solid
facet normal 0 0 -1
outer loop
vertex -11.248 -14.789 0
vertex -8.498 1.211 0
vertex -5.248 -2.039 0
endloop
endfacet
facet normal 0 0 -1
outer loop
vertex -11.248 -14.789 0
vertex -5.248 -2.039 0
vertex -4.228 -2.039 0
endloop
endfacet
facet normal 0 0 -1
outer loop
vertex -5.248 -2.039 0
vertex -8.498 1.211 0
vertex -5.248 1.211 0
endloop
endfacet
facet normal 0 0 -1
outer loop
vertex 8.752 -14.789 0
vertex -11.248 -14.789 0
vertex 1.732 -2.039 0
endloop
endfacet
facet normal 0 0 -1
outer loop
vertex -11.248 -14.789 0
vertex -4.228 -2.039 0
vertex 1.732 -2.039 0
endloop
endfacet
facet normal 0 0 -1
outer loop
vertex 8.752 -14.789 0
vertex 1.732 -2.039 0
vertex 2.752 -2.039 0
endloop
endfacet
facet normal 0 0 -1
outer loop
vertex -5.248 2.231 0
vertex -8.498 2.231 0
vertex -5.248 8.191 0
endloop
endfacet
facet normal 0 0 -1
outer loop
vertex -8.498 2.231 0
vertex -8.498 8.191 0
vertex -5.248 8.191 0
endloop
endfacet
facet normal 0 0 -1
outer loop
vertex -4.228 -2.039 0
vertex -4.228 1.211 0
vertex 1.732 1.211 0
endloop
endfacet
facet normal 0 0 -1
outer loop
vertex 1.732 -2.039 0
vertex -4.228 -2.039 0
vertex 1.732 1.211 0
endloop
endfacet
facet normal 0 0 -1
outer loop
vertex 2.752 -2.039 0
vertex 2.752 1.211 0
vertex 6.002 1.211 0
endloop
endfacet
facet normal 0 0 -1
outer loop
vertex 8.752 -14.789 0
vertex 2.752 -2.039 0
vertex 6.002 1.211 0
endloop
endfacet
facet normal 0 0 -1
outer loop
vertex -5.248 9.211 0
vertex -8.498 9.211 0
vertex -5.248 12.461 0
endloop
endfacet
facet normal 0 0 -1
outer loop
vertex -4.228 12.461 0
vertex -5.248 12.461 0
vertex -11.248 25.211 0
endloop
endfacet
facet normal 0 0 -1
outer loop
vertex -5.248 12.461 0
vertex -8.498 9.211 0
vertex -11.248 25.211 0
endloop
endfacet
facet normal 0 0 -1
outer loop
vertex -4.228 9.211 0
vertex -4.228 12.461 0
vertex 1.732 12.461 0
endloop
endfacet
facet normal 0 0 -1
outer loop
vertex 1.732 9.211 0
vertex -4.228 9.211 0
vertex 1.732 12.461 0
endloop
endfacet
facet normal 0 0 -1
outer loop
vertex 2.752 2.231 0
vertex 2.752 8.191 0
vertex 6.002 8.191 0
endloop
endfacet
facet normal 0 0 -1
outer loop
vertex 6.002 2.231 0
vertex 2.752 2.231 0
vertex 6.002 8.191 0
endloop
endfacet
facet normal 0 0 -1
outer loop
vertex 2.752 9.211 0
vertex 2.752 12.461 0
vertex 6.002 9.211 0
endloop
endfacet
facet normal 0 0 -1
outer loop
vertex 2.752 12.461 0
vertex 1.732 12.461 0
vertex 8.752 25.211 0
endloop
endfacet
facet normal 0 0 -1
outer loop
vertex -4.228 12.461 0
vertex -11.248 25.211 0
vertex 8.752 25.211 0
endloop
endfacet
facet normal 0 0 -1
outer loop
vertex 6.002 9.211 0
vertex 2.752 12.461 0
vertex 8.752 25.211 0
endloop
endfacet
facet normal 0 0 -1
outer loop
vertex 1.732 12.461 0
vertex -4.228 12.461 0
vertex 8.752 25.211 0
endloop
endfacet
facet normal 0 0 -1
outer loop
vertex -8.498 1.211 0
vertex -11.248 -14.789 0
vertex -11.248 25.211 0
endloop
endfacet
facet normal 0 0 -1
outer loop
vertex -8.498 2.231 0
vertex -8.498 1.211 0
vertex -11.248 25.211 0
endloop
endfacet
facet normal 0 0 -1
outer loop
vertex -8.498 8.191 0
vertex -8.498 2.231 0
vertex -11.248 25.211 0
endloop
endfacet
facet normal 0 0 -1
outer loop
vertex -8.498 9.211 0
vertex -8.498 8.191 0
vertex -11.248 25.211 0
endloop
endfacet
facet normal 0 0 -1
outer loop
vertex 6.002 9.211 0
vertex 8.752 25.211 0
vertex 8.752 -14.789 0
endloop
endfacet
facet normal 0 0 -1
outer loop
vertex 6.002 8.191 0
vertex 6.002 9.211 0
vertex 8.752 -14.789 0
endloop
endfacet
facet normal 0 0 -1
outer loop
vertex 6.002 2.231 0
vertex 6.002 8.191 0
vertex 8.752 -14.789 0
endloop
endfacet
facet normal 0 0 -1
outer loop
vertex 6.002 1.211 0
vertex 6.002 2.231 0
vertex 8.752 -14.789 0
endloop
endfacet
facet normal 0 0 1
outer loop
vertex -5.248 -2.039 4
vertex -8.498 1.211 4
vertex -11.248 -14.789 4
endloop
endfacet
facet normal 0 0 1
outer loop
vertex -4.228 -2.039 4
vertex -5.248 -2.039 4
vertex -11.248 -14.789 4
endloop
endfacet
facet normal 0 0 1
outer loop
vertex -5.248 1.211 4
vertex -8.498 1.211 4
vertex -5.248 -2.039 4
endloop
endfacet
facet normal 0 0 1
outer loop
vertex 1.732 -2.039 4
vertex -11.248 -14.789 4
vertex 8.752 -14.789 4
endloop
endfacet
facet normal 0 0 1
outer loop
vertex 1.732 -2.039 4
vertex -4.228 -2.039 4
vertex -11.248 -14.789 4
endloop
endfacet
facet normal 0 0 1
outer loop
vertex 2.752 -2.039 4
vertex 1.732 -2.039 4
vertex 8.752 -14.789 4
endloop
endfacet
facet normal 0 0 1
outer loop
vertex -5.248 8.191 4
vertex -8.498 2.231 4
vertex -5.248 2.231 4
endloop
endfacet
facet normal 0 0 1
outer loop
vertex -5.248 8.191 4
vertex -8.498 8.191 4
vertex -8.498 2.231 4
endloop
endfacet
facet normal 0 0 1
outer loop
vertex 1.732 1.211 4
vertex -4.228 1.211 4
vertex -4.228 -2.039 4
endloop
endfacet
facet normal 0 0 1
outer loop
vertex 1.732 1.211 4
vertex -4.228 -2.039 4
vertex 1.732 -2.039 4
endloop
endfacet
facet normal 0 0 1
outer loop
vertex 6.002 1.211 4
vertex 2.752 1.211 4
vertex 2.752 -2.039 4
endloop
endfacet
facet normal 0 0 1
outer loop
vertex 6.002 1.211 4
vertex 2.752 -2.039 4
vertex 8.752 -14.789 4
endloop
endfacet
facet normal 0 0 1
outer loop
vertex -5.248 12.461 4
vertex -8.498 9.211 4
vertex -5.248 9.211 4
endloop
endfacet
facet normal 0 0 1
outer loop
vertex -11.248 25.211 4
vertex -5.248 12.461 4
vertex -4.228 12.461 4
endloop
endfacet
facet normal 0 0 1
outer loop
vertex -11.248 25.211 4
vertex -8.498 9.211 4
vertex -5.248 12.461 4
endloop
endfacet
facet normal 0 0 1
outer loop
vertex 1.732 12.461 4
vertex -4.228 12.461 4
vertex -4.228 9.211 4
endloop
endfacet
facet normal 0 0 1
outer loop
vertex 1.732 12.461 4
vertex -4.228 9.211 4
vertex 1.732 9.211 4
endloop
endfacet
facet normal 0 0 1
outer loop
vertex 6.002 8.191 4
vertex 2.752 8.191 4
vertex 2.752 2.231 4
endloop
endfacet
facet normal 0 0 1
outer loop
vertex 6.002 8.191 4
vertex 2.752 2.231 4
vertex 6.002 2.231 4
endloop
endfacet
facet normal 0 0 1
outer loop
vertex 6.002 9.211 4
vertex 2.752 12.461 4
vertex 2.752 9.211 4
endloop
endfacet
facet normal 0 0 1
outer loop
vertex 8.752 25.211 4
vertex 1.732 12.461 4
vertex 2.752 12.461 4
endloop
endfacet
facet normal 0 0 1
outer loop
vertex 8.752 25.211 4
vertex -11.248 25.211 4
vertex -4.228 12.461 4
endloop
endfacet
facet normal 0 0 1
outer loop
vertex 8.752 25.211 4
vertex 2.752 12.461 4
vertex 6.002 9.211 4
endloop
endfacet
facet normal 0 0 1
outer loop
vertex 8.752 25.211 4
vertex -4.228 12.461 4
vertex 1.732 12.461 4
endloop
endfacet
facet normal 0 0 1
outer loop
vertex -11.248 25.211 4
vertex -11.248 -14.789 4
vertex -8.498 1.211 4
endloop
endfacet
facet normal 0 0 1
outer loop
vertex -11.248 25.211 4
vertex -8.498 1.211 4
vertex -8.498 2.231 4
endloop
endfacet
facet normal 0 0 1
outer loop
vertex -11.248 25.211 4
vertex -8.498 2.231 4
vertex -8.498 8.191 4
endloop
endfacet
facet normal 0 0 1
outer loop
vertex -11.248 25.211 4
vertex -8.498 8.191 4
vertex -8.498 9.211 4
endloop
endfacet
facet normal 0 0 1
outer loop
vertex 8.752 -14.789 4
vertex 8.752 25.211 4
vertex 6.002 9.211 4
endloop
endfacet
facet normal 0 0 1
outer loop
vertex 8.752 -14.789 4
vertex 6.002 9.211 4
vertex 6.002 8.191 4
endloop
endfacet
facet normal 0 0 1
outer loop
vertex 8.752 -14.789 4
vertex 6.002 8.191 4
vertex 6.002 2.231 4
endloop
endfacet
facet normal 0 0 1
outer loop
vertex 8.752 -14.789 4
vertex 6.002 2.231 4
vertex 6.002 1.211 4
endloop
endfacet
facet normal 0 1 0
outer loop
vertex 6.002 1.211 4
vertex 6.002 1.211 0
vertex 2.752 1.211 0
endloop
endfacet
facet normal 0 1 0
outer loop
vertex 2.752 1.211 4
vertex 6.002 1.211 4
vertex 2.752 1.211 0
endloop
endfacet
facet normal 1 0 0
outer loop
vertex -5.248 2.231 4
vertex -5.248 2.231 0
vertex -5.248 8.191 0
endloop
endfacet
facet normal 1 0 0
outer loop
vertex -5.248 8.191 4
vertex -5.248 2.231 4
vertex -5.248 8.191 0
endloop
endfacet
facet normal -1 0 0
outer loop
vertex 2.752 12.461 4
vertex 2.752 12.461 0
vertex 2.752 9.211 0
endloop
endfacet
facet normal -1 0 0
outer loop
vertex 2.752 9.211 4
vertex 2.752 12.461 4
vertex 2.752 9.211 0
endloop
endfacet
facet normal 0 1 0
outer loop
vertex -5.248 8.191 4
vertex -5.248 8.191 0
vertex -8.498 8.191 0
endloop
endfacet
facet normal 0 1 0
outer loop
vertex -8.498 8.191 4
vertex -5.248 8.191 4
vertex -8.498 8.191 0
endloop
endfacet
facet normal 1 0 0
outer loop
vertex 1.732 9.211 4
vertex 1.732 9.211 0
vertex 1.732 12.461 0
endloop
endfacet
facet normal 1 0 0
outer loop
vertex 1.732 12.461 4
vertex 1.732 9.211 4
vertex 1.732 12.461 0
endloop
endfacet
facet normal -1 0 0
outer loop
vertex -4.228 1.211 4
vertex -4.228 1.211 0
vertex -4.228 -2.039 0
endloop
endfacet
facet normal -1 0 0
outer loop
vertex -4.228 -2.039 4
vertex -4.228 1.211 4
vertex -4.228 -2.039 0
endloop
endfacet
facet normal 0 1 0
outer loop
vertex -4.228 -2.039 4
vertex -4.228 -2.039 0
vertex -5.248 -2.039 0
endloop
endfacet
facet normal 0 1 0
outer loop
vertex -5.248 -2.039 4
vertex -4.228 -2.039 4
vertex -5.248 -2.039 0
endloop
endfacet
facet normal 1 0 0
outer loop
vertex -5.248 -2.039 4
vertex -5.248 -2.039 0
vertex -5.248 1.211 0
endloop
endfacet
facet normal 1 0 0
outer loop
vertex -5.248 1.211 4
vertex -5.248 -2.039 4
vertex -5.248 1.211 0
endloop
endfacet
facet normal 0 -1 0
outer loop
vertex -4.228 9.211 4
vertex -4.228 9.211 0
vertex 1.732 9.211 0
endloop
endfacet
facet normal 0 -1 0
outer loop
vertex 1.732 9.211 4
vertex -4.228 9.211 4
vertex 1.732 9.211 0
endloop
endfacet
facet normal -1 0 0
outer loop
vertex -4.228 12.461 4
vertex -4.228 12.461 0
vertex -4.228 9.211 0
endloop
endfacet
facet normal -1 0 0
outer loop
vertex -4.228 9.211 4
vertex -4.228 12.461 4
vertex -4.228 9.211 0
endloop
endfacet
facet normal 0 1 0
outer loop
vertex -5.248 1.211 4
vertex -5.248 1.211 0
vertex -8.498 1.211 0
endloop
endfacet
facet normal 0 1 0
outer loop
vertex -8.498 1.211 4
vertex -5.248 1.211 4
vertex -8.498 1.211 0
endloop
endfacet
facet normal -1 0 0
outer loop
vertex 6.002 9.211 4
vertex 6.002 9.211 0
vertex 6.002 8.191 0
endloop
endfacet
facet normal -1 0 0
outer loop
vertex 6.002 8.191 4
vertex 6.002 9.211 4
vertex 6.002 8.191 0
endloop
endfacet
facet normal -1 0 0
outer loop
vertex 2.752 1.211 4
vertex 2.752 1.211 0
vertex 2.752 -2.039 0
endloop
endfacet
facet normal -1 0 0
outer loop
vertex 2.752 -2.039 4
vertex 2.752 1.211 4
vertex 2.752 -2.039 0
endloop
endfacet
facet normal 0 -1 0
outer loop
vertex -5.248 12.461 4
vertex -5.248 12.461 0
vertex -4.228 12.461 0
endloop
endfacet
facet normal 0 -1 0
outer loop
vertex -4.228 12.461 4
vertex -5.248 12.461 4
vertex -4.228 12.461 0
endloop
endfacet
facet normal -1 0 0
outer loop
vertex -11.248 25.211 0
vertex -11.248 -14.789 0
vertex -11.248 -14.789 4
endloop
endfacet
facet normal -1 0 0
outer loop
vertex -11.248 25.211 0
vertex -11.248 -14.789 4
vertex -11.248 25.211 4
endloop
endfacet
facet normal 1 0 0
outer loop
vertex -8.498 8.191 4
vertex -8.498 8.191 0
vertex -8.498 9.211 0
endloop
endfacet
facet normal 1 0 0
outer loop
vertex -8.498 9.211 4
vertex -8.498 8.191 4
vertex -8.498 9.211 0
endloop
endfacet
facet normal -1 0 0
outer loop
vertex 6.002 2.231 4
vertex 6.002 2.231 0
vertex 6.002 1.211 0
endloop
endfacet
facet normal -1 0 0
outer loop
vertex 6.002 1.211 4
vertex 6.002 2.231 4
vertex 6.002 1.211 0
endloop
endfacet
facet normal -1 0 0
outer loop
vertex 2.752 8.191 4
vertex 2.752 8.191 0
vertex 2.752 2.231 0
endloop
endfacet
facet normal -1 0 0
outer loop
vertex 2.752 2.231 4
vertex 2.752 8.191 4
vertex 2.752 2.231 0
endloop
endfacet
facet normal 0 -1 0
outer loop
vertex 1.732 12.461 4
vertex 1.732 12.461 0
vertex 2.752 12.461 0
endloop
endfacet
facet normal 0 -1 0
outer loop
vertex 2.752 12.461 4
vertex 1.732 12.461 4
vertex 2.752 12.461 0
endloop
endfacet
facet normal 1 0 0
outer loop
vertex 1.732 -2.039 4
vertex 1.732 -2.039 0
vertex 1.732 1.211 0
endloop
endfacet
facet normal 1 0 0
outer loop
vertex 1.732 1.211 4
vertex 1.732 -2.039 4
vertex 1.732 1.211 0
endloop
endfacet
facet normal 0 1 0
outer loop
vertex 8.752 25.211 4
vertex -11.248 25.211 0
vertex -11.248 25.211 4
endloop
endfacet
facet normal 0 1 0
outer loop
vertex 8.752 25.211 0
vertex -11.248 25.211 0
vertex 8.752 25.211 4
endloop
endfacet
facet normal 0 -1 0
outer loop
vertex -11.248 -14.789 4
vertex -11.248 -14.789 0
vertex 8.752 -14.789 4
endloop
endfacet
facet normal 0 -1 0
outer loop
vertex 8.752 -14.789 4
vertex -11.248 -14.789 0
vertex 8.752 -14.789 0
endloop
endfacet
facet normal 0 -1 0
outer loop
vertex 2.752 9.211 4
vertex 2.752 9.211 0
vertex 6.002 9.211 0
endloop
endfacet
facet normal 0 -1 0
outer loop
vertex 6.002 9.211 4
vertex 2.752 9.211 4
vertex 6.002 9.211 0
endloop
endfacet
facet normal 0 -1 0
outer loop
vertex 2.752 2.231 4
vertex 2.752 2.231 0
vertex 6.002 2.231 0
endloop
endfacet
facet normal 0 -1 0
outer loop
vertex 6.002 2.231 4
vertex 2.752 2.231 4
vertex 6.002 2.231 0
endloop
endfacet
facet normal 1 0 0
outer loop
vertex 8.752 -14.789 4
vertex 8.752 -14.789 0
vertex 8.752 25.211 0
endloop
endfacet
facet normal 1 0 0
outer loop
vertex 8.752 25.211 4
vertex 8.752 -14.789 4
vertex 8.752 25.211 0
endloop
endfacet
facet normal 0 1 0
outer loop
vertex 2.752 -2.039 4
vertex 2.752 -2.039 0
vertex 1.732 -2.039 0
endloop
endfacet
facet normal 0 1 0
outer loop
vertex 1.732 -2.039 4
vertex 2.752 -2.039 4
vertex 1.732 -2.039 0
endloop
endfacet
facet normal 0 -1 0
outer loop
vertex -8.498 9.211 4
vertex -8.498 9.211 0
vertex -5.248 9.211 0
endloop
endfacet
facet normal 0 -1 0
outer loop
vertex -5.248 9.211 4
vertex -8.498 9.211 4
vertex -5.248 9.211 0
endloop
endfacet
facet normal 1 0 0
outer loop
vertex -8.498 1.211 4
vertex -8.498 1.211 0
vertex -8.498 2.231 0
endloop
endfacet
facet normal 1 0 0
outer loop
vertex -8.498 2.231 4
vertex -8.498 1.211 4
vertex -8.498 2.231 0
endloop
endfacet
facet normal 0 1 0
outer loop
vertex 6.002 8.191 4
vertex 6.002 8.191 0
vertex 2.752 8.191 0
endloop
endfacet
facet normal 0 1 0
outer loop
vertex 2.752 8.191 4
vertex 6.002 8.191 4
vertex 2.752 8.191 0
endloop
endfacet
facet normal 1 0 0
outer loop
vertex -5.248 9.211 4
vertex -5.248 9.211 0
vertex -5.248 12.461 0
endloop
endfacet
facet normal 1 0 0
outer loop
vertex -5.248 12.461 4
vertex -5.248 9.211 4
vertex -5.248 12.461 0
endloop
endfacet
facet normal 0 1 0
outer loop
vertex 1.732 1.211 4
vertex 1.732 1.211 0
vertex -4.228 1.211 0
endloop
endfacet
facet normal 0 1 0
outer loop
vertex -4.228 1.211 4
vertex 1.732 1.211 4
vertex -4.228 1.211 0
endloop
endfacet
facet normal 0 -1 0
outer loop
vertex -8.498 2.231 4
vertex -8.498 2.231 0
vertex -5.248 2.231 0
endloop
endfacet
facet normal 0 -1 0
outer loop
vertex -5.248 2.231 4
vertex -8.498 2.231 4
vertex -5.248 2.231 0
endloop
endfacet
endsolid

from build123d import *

# Parameters (mm, degrees)
F0_W     = 20
F0_H     = 40
F1_DEPTH = 4


with BuildPart() as f1:
    # F0 (on Top) → F1 (new body)
    with BuildSketch(Plane.XY):
        with Locations((-1.248105, 5.210561)):
            Rectangle(F0_W, F0_H)
        Polygon((-4.228105, 12.460561), (-4.228105, 9.210561), (1.731895, 9.210561), (1.731895, 12.460561), (2.751895, 12.460561), (2.751895, 9.210561), (6.001895, 9.210561), (6.001895, 8.190561), (2.751895, 8.190561), (2.751895, 2.230561), (6.001895, 2.230561), (6.001895, 1.210561), (2.751895, 1.210561), (2.751895, -2.039439), (1.731895, -2.039439), (1.731895, 1.210561), (-4.228105, 1.210561), (-4.228105, -2.039439), (-5.248105, -2.039439), (-5.248105, 1.210561), (-8.498105, 1.210561), (-8.498105, 2.230561), (-5.248105, 2.230561), (-5.248105, 8.190561), (-8.498105, 8.190561), (-8.498105, 9.210561), (-5.248105, 9.210561), (-5.248105, 12.460561), align=None, mode=Mode.SUBTRACT)
    extrude(amount=F1_DEPTH)


solid = f1.part
